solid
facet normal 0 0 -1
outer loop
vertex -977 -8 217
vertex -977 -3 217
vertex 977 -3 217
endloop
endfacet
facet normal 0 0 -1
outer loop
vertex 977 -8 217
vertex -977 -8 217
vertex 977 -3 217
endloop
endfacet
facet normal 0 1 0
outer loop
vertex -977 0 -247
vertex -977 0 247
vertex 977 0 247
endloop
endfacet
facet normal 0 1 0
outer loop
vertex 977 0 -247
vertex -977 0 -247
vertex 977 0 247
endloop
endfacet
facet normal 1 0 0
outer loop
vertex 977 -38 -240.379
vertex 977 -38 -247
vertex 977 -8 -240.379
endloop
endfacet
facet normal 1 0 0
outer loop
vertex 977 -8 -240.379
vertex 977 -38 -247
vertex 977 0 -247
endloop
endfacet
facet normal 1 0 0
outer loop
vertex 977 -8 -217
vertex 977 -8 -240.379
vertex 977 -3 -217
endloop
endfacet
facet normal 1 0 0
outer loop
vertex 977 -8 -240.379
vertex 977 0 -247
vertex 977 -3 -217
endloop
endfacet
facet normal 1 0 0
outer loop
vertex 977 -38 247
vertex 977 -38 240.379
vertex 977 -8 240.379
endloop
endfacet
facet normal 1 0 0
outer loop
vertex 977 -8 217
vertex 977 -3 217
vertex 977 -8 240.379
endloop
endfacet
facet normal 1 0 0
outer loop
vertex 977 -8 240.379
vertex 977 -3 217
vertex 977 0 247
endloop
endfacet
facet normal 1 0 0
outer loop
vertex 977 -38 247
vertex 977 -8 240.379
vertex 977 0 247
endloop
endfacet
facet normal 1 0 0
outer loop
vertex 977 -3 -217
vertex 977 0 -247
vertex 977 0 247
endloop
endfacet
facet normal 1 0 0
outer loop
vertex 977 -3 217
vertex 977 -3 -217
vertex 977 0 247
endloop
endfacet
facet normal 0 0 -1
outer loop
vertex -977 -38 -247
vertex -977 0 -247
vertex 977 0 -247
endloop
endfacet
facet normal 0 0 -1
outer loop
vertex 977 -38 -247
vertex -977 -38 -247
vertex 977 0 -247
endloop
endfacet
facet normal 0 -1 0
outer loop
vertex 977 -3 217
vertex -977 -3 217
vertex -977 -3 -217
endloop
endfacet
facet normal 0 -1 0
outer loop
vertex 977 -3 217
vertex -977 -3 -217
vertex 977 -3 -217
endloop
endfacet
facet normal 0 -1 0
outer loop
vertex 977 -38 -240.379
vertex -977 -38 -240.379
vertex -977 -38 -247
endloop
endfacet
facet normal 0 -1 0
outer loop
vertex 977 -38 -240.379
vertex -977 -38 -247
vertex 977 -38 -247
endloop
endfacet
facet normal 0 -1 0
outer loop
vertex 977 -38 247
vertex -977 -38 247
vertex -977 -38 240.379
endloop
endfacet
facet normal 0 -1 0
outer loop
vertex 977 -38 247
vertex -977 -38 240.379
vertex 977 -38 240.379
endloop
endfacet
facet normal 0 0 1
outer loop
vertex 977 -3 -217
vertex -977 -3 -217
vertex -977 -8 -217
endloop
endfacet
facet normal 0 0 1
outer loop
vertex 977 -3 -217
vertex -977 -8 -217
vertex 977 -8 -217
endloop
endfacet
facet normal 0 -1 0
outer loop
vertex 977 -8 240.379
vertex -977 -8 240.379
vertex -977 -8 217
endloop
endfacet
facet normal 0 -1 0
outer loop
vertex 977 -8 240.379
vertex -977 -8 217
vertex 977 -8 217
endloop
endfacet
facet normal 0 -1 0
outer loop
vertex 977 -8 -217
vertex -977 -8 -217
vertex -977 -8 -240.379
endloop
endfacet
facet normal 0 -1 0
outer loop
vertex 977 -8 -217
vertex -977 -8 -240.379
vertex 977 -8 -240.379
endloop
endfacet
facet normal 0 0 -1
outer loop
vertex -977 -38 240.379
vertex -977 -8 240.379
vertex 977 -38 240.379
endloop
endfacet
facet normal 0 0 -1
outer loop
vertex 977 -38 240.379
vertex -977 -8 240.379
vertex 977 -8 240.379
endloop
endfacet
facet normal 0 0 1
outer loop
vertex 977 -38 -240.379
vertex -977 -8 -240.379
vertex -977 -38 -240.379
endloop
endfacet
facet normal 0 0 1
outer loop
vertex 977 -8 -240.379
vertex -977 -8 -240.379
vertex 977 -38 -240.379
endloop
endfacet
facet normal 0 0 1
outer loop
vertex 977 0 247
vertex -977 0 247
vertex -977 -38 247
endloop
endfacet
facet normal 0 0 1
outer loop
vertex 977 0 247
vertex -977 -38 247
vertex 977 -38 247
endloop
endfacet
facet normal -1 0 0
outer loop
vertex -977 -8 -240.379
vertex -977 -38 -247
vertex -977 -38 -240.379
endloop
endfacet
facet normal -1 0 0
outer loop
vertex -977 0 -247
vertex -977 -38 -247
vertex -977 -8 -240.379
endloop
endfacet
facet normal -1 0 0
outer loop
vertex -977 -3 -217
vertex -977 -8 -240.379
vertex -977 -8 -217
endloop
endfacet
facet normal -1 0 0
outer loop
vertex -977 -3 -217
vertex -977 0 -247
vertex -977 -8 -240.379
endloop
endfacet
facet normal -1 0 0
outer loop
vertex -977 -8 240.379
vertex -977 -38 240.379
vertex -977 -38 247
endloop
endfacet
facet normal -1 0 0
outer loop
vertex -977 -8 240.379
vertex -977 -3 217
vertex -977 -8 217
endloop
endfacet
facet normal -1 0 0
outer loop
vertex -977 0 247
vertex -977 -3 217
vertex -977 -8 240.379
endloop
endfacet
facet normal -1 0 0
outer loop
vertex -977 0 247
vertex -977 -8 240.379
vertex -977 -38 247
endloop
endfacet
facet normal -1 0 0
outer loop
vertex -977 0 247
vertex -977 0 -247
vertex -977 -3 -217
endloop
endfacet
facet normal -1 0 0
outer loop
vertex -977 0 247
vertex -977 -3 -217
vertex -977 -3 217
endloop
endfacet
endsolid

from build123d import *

# Parameters (mm, degrees)
F0_W     = 1954
F0_H     = 494
F1_DEPTH = 3
F2_W     = 1954
F2_H     = 30
F3_DEPTH = 5
F4_W     = 1954
F4_H     = 6.620756
F5_DEPTH = 30


with BuildPart() as f1:
    # F0 (on Front) → F1 (new body)
    with BuildSketch(Plane.XZ):
        Rectangle(F0_W, F0_H)
    extrude(amount=F1_DEPTH)

    # F2 (on face) → F3 (join)
    with BuildSketch(Plane.XZ.offset(3)):
        with Locations((0, 232)):
            Rectangle(F2_W, F2_H)
        with Locations((0, -232)):
            Rectangle(F2_W, F2_H)
    extrude(amount=F3_DEPTH)

    # F4 (on face) → F5 (join)
    with BuildSketch(Plane.XZ.offset(8)):
        with Locations((0, 243.689622)):
            Rectangle(F4_W, F4_H)
        with Locations((0, -243.689622)):
            Rectangle(F4_W, F4_H)
    extrude(amount=F5_DEPTH)


solid = f1.part
